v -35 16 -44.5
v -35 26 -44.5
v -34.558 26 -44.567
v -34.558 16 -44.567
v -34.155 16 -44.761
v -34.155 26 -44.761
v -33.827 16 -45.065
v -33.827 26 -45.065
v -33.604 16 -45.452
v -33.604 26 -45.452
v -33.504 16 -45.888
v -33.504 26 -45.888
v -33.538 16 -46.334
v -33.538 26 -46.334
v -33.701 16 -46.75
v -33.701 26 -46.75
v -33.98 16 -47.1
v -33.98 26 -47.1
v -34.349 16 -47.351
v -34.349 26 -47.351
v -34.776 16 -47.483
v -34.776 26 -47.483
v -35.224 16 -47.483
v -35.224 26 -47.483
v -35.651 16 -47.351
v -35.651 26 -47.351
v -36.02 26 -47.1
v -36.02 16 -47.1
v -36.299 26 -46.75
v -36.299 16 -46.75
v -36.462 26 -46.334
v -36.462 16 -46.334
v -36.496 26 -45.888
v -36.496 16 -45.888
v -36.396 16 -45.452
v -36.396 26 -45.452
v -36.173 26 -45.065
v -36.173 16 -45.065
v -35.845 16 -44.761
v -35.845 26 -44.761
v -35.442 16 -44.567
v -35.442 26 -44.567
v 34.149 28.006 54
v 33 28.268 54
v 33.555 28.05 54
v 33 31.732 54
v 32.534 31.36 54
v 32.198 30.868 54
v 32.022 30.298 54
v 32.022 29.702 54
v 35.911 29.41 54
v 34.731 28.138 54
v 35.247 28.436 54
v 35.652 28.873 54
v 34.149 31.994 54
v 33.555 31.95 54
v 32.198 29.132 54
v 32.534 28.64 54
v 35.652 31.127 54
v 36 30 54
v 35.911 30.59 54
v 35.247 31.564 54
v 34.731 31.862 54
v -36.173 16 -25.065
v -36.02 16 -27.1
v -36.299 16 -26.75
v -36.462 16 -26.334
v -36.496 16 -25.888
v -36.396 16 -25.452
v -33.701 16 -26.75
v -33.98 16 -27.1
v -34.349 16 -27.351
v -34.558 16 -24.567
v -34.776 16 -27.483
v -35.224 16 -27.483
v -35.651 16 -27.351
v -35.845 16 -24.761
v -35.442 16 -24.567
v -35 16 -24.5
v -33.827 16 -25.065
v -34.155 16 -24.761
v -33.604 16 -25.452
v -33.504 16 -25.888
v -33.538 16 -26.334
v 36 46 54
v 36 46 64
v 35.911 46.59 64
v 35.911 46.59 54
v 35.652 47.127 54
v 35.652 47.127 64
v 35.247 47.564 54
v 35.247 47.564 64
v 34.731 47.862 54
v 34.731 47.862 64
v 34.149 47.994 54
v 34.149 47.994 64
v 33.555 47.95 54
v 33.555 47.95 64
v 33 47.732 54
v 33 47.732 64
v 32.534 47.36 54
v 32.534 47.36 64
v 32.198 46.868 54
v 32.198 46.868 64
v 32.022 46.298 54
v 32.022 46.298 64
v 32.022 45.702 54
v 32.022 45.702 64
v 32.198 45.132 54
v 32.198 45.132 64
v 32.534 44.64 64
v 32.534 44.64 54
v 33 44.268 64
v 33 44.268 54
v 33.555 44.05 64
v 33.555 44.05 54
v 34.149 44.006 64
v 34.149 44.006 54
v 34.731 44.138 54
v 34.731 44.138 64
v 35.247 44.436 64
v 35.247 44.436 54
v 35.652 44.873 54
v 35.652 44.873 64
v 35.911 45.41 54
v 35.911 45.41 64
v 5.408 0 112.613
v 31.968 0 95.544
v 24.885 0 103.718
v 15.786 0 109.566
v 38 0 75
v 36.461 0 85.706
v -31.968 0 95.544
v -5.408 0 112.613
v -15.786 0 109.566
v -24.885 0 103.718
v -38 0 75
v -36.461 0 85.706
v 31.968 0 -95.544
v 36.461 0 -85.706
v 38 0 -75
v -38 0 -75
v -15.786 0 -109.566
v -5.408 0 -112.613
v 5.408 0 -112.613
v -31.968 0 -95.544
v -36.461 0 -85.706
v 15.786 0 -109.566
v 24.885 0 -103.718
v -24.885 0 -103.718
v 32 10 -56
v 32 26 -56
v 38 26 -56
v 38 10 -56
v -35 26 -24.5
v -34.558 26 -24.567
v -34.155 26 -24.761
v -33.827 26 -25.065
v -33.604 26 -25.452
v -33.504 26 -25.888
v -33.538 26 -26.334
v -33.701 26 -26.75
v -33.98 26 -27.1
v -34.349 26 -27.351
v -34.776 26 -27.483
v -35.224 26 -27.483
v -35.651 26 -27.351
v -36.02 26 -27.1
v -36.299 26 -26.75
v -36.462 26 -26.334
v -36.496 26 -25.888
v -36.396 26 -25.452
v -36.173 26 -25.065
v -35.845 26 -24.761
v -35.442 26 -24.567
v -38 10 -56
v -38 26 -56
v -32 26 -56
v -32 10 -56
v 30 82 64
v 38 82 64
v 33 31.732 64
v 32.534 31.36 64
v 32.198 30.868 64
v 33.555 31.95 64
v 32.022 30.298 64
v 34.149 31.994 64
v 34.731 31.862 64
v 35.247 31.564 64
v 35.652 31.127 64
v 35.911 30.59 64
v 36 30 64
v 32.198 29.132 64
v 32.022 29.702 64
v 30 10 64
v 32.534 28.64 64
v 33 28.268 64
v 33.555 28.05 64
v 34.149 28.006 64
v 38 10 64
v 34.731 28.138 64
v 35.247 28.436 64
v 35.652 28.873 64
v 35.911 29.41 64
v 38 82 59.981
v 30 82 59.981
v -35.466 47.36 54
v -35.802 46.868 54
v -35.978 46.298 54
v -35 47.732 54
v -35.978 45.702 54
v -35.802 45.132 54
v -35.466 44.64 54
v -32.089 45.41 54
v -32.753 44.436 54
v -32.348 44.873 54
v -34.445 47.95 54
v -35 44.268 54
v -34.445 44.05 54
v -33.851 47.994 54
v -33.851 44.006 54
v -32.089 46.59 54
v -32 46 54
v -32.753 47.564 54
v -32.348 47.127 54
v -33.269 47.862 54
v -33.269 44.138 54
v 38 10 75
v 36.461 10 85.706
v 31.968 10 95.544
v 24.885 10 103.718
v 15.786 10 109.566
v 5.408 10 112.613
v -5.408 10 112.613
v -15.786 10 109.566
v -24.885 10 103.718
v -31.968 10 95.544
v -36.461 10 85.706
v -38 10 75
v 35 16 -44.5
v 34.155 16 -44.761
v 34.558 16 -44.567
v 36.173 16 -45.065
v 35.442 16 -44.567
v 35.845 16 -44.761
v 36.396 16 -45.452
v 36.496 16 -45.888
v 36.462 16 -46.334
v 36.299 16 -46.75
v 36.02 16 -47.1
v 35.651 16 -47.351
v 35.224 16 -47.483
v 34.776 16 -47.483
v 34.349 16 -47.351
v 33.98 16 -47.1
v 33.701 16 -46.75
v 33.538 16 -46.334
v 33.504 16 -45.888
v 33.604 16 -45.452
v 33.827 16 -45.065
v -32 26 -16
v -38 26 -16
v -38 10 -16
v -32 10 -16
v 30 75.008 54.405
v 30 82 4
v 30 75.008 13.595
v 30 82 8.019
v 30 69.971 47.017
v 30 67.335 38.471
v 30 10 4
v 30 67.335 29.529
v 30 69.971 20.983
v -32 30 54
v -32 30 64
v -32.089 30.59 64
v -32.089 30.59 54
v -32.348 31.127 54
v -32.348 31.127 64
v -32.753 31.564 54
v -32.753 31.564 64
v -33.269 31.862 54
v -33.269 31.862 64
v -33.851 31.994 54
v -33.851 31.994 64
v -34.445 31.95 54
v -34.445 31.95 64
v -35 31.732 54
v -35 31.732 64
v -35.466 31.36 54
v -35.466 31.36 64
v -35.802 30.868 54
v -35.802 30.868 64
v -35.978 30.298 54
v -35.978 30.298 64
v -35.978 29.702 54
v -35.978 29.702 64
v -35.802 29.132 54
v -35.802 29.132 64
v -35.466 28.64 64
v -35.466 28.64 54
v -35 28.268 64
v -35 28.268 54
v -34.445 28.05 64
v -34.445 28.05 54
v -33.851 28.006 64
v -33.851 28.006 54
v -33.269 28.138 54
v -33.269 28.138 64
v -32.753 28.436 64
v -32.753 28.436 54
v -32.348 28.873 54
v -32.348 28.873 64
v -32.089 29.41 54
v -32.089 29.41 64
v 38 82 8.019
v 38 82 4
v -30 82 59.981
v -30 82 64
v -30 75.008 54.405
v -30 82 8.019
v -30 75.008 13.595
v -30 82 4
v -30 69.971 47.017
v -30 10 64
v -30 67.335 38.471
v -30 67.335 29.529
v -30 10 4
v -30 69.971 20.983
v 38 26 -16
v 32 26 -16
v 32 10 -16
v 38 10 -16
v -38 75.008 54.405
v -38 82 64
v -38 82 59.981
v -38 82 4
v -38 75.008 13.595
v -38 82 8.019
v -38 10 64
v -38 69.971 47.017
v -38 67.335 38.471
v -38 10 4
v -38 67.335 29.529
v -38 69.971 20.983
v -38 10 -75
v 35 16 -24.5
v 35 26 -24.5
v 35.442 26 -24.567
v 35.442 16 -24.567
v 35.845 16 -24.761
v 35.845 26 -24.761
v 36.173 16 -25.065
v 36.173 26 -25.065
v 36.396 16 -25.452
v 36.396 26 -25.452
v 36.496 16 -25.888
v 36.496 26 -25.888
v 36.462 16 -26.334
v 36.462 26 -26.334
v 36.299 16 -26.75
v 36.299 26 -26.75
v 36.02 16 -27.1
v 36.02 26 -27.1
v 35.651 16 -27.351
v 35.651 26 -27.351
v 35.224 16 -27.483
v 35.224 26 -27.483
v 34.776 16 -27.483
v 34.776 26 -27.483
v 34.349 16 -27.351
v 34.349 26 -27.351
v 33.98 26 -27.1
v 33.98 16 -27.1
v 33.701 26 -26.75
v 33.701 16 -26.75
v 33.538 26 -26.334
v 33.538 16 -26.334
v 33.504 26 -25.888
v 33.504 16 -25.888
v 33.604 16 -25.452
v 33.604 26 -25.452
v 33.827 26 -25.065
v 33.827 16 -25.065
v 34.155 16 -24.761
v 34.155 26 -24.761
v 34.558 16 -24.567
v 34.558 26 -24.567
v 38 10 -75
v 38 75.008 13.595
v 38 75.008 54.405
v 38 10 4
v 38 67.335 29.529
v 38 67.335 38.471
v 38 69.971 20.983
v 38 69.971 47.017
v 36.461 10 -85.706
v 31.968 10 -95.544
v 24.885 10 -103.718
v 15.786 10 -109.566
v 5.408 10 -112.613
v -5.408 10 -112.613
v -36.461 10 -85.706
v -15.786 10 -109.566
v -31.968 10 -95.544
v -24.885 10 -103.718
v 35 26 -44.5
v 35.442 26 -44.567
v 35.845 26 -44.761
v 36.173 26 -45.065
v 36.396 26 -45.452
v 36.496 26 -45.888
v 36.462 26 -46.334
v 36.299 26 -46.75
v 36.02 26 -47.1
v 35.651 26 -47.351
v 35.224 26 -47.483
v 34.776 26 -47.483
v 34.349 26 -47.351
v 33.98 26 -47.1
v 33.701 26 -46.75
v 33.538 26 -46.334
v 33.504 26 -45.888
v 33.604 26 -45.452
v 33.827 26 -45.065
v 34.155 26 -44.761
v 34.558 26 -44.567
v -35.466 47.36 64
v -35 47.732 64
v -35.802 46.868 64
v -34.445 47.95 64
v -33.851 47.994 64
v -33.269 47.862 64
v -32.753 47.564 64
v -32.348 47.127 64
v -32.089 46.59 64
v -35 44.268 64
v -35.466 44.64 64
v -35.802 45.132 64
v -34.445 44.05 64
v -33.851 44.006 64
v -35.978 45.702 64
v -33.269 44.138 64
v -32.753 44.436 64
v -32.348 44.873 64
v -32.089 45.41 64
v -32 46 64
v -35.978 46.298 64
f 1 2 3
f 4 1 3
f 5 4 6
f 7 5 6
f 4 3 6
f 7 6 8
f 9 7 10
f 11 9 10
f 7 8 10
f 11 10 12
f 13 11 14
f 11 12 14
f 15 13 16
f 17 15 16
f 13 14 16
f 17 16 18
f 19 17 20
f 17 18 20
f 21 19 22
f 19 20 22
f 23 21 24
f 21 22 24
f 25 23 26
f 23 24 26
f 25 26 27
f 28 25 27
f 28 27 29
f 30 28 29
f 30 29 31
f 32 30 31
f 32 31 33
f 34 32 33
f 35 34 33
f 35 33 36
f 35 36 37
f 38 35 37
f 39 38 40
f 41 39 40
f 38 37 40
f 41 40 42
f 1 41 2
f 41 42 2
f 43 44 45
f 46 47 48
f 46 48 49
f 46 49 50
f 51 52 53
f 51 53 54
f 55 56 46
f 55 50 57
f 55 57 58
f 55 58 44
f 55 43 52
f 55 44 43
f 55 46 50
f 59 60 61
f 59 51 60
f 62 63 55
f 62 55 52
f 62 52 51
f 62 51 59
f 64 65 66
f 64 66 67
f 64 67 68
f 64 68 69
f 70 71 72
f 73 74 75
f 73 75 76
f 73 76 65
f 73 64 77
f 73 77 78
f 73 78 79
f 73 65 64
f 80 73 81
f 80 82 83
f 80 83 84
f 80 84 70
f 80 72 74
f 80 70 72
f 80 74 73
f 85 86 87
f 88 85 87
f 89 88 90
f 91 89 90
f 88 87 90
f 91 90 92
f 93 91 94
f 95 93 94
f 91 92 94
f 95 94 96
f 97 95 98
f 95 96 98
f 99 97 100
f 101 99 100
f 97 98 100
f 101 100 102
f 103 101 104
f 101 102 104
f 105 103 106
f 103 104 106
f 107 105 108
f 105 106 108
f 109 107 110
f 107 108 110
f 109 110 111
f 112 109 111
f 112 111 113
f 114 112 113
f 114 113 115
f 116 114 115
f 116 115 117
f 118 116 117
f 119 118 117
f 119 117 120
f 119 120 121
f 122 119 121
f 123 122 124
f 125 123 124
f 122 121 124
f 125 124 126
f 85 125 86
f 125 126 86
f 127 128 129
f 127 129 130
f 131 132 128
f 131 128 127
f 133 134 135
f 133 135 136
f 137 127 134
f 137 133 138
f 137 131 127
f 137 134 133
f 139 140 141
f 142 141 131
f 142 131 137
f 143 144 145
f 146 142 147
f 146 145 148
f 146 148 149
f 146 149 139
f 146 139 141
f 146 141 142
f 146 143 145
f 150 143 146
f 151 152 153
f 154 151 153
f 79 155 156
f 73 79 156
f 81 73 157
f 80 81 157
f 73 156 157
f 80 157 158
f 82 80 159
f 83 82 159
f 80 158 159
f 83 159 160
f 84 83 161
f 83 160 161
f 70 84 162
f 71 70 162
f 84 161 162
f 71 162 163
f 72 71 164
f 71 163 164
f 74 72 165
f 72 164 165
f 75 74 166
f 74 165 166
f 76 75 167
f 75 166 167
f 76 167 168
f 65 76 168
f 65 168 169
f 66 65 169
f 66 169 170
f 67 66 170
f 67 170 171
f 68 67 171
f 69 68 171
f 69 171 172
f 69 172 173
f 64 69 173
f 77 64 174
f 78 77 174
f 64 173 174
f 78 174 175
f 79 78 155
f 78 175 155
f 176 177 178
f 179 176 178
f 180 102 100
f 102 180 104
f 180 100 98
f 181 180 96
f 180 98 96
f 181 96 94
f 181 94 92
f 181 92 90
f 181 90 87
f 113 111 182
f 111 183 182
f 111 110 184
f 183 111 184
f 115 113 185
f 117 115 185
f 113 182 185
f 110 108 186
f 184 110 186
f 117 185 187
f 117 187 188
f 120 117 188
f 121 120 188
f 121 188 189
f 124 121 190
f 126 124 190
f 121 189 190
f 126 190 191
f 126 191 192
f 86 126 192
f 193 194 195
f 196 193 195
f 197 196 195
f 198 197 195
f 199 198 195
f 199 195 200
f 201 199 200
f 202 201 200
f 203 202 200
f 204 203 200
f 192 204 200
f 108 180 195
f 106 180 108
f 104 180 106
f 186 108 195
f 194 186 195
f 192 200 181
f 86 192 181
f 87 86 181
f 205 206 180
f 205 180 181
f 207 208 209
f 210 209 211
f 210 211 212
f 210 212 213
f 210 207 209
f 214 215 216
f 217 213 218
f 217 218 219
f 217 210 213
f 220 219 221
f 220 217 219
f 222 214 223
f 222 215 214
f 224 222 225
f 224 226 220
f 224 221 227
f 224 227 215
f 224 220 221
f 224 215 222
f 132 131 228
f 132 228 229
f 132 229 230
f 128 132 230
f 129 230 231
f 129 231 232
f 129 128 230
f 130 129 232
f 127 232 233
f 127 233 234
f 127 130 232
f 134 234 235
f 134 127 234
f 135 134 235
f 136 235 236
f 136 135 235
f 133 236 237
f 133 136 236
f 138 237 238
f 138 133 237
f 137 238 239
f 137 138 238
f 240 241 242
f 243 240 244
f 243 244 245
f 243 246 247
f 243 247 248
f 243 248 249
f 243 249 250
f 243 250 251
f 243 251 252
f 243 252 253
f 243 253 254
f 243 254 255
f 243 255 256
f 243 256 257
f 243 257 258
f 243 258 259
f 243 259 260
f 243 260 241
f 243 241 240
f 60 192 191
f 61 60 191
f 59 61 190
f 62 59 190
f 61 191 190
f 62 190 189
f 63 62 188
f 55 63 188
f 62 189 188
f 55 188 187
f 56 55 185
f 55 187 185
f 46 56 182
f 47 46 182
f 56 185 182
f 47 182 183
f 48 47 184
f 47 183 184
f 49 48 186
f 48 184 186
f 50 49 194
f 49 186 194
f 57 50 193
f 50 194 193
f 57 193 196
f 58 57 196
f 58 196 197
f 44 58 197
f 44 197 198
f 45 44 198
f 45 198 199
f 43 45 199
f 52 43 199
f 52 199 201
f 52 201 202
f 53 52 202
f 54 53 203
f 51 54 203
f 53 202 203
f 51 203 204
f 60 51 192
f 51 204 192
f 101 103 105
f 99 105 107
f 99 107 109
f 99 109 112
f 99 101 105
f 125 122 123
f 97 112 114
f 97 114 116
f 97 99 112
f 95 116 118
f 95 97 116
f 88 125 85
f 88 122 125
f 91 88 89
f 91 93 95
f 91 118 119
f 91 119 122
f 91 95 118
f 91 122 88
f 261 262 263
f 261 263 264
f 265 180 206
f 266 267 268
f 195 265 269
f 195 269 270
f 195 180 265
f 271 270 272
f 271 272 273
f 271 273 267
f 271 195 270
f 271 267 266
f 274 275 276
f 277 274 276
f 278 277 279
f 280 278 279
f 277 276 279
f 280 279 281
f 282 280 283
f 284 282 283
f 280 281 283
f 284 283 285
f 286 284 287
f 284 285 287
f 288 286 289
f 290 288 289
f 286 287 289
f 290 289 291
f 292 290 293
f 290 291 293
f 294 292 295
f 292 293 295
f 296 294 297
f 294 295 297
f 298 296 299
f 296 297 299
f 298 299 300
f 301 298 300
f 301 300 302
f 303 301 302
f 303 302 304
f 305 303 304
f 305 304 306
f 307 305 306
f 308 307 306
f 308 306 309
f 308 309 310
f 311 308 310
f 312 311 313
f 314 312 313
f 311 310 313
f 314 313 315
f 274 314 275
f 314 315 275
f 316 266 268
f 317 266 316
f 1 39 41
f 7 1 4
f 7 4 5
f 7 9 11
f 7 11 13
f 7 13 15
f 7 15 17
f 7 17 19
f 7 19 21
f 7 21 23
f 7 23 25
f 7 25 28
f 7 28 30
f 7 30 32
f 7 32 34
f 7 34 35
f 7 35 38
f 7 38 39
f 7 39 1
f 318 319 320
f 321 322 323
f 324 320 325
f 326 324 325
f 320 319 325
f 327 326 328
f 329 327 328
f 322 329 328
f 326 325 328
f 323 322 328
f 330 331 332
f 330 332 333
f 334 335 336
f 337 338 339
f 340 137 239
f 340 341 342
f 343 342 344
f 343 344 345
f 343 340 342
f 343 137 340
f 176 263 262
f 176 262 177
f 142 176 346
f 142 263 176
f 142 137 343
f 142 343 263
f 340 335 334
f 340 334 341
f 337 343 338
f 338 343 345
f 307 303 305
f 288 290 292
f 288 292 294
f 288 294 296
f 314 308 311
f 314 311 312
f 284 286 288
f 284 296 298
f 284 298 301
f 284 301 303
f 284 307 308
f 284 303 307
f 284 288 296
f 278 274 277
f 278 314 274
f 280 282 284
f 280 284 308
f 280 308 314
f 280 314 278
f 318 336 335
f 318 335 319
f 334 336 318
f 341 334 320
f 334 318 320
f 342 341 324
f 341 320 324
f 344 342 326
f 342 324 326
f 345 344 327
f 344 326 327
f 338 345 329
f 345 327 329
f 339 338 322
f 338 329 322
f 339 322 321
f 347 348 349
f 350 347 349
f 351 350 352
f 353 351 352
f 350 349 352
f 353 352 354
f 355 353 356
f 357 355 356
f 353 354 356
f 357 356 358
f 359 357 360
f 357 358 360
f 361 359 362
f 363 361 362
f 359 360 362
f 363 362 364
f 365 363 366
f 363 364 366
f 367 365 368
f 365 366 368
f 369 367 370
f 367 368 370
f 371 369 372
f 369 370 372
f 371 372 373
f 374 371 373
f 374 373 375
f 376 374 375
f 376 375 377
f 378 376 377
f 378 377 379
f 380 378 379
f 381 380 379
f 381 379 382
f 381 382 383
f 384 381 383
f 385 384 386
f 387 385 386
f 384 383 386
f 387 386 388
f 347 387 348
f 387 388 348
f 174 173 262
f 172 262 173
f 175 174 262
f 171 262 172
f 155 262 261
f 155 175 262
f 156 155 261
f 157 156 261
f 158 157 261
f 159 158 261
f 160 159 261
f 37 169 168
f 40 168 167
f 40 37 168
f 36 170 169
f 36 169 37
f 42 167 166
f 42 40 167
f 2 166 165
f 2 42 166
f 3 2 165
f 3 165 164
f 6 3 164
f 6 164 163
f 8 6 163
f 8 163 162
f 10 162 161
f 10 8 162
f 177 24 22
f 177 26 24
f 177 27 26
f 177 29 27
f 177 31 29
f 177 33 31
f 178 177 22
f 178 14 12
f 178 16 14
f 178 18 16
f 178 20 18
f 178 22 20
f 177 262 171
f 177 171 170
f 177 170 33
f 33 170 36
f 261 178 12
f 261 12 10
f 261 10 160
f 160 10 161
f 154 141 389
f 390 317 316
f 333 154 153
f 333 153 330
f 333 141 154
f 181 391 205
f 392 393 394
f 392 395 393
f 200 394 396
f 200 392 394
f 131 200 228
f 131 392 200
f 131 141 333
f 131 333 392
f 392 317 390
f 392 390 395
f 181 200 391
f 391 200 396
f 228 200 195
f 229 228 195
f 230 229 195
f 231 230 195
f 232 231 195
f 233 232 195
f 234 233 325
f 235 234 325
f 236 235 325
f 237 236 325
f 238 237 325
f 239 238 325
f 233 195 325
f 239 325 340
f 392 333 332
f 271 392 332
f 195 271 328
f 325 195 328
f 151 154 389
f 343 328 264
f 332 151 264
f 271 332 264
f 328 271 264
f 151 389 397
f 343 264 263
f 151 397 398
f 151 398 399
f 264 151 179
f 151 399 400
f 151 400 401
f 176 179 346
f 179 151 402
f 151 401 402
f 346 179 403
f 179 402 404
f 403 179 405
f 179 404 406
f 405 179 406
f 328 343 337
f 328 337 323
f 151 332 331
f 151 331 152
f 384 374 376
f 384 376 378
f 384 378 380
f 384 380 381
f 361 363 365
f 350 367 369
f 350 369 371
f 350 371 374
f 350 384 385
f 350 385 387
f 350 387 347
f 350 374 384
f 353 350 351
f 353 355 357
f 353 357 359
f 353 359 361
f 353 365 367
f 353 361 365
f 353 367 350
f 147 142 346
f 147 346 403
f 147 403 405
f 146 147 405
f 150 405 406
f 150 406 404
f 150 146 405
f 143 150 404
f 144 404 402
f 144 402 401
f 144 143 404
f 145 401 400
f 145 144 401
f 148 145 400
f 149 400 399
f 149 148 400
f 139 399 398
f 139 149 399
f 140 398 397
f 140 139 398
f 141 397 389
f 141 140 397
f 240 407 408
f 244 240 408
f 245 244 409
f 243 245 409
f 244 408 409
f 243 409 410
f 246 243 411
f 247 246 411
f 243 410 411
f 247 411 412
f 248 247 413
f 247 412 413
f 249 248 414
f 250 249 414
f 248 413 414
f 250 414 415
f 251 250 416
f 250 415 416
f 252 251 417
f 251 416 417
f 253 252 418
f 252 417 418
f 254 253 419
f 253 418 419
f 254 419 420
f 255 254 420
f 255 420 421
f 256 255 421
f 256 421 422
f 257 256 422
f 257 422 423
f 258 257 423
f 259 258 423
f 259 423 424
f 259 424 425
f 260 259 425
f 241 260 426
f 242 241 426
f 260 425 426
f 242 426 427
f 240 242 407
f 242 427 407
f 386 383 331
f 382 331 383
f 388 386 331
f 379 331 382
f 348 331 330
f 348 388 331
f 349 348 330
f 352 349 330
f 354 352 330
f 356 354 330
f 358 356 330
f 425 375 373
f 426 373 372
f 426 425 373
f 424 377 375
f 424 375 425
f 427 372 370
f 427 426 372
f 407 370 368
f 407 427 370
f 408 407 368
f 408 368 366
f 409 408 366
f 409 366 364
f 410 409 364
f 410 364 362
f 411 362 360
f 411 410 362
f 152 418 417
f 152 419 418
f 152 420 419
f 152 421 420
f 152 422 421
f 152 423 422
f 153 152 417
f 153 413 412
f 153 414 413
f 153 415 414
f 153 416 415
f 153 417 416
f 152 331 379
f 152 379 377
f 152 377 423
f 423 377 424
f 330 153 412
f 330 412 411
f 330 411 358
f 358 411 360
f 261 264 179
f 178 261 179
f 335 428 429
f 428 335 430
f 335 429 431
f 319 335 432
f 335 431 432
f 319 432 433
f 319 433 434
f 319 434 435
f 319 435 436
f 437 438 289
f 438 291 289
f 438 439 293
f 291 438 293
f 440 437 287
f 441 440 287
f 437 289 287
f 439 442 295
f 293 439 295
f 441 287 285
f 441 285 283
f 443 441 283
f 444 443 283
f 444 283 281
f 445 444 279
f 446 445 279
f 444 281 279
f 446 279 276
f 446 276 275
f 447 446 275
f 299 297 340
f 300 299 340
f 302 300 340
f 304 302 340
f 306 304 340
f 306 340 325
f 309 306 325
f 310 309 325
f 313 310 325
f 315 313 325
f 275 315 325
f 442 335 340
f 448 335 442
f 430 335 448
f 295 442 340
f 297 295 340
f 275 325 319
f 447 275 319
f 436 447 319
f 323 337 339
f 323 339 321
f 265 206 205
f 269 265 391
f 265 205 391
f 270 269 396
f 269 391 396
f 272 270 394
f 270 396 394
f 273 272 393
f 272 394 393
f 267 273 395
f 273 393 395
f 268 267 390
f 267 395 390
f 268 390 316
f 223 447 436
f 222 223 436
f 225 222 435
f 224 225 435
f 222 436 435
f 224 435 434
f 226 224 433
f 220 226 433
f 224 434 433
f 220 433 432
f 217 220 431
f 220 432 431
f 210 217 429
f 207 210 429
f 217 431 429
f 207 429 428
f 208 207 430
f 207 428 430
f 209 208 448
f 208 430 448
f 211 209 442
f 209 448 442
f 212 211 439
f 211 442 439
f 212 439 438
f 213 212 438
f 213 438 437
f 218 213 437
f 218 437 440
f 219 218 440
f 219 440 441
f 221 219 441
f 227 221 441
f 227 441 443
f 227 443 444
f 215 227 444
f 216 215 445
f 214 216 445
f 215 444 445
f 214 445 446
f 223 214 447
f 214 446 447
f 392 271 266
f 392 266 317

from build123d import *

# Parameters (mm, degrees)
EXTRUDE_1_DEPTH     = 10
SKETCH_3_W          = 8
SKETCH_3_H          = 60
EXTRUDE_2_DEPTH     = 72
SKETCH_4_W          = 6
SKETCH_4_H          = 40
EXTRUDE_3_DEPTH     = 16
SKETCH_5_R          = 30
CUT_EXTRUDE_1_DEPTH = 159.962259672
SKETCH_6_R          = 2
CUT_EXTRUDE_2_DEPTH = 10
SKETCH_7_R          = 1.5
CUT_EXTRUDE_3_DEPTH = 10


with BuildPart() as part:
    # 草图1 → 凸台-拉伸1 (new body)
    with BuildSketch(Plane(origin=(0, 0, 0), x_dir=(1, 0, 0), z_dir=(0, 1, 0))):
        with BuildLine():
            Line((-38, -75), (-38, 75))
            ThreePointArc((-38, 75), (0, 113), (38, 75))
            Line((38, 75), (38, -75))
            ThreePointArc((38, -75), (0, -113), (-38, -75))
        make_face()
    extrude(amount=EXTRUDE_1_DEPTH)

    # 草图3 → 凸台-拉伸2 (add)
    with BuildSketch(Plane(origin=(0, 10, 0), x_dir=(1, 0, 0), z_dir=(0, 1, 0))):
        with Locations((-34, -34)):
            Rectangle(SKETCH_3_W, SKETCH_3_H)
        with Locations((34, -34)):
            Rectangle(SKETCH_3_W, SKETCH_3_H)
    extrude(amount=EXTRUDE_2_DEPTH)

    # 草图4 → 凸台-拉伸3 (add)
    with BuildSketch(Plane(origin=(0, 10, 0), x_dir=(1, 0, 0), z_dir=(0, 1, 0))):
        with Locations((-35, 36)):
            Rectangle(SKETCH_4_W, SKETCH_4_H)
        with Locations((35, 36)):
            Rectangle(SKETCH_4_W, SKETCH_4_H)
    extrude(amount=EXTRUDE_3_DEPTH)

    # 草图5 → 切除-拉伸1 (cut, through all)
    with BuildSketch(Plane(origin=(38, 0, 0), x_dir=(0, 0, -1), z_dir=(1, 0, 0))):
        with Locations((-34, 97)):
            Circle(SKETCH_5_R)
    extrude(amount=-CUT_EXTRUDE_1_DEPTH, mode=Mode.SUBTRACT)

    # 草图6 → 切除-拉伸2 (cut)
    with BuildSketch(Plane.XY.offset(64)):
        with Locations((-34, 46)):
            Circle(SKETCH_6_R)
        with Locations((-34, 30)):
            Circle(SKETCH_6_R)
        with Locations((34, 46)):
            Circle(SKETCH_6_R)
        with Locations((34, 30)):
            Circle(SKETCH_6_R)
    extrude(amount=-CUT_EXTRUDE_2_DEPTH, mode=Mode.SUBTRACT)

    # 草图7 → 切除-拉伸3 (cut)
    with BuildSketch(Plane(origin=(0, 26, 0), x_dir=(1, 0, 0), z_dir=(0, 1, 0))):
        with Locations(Location((-35, 26, 0), (0, 0, 270))):
            Circle(SKETCH_7_R)
        with Locations(Location((-35, 46, 0), (0, 0, 270))):
            Circle(SKETCH_7_R)
        with Locations(Location((35, 26, 0), (0, 0, 270))):
            Circle(SKETCH_7_R)
        with Locations(Location((35, 46, 0), (0, 0, 270))):
            Circle(SKETCH_7_R)
    extrude(amount=-CUT_EXTRUDE_3_DEPTH, mode=Mode.SUBTRACT)


solid = part.part
